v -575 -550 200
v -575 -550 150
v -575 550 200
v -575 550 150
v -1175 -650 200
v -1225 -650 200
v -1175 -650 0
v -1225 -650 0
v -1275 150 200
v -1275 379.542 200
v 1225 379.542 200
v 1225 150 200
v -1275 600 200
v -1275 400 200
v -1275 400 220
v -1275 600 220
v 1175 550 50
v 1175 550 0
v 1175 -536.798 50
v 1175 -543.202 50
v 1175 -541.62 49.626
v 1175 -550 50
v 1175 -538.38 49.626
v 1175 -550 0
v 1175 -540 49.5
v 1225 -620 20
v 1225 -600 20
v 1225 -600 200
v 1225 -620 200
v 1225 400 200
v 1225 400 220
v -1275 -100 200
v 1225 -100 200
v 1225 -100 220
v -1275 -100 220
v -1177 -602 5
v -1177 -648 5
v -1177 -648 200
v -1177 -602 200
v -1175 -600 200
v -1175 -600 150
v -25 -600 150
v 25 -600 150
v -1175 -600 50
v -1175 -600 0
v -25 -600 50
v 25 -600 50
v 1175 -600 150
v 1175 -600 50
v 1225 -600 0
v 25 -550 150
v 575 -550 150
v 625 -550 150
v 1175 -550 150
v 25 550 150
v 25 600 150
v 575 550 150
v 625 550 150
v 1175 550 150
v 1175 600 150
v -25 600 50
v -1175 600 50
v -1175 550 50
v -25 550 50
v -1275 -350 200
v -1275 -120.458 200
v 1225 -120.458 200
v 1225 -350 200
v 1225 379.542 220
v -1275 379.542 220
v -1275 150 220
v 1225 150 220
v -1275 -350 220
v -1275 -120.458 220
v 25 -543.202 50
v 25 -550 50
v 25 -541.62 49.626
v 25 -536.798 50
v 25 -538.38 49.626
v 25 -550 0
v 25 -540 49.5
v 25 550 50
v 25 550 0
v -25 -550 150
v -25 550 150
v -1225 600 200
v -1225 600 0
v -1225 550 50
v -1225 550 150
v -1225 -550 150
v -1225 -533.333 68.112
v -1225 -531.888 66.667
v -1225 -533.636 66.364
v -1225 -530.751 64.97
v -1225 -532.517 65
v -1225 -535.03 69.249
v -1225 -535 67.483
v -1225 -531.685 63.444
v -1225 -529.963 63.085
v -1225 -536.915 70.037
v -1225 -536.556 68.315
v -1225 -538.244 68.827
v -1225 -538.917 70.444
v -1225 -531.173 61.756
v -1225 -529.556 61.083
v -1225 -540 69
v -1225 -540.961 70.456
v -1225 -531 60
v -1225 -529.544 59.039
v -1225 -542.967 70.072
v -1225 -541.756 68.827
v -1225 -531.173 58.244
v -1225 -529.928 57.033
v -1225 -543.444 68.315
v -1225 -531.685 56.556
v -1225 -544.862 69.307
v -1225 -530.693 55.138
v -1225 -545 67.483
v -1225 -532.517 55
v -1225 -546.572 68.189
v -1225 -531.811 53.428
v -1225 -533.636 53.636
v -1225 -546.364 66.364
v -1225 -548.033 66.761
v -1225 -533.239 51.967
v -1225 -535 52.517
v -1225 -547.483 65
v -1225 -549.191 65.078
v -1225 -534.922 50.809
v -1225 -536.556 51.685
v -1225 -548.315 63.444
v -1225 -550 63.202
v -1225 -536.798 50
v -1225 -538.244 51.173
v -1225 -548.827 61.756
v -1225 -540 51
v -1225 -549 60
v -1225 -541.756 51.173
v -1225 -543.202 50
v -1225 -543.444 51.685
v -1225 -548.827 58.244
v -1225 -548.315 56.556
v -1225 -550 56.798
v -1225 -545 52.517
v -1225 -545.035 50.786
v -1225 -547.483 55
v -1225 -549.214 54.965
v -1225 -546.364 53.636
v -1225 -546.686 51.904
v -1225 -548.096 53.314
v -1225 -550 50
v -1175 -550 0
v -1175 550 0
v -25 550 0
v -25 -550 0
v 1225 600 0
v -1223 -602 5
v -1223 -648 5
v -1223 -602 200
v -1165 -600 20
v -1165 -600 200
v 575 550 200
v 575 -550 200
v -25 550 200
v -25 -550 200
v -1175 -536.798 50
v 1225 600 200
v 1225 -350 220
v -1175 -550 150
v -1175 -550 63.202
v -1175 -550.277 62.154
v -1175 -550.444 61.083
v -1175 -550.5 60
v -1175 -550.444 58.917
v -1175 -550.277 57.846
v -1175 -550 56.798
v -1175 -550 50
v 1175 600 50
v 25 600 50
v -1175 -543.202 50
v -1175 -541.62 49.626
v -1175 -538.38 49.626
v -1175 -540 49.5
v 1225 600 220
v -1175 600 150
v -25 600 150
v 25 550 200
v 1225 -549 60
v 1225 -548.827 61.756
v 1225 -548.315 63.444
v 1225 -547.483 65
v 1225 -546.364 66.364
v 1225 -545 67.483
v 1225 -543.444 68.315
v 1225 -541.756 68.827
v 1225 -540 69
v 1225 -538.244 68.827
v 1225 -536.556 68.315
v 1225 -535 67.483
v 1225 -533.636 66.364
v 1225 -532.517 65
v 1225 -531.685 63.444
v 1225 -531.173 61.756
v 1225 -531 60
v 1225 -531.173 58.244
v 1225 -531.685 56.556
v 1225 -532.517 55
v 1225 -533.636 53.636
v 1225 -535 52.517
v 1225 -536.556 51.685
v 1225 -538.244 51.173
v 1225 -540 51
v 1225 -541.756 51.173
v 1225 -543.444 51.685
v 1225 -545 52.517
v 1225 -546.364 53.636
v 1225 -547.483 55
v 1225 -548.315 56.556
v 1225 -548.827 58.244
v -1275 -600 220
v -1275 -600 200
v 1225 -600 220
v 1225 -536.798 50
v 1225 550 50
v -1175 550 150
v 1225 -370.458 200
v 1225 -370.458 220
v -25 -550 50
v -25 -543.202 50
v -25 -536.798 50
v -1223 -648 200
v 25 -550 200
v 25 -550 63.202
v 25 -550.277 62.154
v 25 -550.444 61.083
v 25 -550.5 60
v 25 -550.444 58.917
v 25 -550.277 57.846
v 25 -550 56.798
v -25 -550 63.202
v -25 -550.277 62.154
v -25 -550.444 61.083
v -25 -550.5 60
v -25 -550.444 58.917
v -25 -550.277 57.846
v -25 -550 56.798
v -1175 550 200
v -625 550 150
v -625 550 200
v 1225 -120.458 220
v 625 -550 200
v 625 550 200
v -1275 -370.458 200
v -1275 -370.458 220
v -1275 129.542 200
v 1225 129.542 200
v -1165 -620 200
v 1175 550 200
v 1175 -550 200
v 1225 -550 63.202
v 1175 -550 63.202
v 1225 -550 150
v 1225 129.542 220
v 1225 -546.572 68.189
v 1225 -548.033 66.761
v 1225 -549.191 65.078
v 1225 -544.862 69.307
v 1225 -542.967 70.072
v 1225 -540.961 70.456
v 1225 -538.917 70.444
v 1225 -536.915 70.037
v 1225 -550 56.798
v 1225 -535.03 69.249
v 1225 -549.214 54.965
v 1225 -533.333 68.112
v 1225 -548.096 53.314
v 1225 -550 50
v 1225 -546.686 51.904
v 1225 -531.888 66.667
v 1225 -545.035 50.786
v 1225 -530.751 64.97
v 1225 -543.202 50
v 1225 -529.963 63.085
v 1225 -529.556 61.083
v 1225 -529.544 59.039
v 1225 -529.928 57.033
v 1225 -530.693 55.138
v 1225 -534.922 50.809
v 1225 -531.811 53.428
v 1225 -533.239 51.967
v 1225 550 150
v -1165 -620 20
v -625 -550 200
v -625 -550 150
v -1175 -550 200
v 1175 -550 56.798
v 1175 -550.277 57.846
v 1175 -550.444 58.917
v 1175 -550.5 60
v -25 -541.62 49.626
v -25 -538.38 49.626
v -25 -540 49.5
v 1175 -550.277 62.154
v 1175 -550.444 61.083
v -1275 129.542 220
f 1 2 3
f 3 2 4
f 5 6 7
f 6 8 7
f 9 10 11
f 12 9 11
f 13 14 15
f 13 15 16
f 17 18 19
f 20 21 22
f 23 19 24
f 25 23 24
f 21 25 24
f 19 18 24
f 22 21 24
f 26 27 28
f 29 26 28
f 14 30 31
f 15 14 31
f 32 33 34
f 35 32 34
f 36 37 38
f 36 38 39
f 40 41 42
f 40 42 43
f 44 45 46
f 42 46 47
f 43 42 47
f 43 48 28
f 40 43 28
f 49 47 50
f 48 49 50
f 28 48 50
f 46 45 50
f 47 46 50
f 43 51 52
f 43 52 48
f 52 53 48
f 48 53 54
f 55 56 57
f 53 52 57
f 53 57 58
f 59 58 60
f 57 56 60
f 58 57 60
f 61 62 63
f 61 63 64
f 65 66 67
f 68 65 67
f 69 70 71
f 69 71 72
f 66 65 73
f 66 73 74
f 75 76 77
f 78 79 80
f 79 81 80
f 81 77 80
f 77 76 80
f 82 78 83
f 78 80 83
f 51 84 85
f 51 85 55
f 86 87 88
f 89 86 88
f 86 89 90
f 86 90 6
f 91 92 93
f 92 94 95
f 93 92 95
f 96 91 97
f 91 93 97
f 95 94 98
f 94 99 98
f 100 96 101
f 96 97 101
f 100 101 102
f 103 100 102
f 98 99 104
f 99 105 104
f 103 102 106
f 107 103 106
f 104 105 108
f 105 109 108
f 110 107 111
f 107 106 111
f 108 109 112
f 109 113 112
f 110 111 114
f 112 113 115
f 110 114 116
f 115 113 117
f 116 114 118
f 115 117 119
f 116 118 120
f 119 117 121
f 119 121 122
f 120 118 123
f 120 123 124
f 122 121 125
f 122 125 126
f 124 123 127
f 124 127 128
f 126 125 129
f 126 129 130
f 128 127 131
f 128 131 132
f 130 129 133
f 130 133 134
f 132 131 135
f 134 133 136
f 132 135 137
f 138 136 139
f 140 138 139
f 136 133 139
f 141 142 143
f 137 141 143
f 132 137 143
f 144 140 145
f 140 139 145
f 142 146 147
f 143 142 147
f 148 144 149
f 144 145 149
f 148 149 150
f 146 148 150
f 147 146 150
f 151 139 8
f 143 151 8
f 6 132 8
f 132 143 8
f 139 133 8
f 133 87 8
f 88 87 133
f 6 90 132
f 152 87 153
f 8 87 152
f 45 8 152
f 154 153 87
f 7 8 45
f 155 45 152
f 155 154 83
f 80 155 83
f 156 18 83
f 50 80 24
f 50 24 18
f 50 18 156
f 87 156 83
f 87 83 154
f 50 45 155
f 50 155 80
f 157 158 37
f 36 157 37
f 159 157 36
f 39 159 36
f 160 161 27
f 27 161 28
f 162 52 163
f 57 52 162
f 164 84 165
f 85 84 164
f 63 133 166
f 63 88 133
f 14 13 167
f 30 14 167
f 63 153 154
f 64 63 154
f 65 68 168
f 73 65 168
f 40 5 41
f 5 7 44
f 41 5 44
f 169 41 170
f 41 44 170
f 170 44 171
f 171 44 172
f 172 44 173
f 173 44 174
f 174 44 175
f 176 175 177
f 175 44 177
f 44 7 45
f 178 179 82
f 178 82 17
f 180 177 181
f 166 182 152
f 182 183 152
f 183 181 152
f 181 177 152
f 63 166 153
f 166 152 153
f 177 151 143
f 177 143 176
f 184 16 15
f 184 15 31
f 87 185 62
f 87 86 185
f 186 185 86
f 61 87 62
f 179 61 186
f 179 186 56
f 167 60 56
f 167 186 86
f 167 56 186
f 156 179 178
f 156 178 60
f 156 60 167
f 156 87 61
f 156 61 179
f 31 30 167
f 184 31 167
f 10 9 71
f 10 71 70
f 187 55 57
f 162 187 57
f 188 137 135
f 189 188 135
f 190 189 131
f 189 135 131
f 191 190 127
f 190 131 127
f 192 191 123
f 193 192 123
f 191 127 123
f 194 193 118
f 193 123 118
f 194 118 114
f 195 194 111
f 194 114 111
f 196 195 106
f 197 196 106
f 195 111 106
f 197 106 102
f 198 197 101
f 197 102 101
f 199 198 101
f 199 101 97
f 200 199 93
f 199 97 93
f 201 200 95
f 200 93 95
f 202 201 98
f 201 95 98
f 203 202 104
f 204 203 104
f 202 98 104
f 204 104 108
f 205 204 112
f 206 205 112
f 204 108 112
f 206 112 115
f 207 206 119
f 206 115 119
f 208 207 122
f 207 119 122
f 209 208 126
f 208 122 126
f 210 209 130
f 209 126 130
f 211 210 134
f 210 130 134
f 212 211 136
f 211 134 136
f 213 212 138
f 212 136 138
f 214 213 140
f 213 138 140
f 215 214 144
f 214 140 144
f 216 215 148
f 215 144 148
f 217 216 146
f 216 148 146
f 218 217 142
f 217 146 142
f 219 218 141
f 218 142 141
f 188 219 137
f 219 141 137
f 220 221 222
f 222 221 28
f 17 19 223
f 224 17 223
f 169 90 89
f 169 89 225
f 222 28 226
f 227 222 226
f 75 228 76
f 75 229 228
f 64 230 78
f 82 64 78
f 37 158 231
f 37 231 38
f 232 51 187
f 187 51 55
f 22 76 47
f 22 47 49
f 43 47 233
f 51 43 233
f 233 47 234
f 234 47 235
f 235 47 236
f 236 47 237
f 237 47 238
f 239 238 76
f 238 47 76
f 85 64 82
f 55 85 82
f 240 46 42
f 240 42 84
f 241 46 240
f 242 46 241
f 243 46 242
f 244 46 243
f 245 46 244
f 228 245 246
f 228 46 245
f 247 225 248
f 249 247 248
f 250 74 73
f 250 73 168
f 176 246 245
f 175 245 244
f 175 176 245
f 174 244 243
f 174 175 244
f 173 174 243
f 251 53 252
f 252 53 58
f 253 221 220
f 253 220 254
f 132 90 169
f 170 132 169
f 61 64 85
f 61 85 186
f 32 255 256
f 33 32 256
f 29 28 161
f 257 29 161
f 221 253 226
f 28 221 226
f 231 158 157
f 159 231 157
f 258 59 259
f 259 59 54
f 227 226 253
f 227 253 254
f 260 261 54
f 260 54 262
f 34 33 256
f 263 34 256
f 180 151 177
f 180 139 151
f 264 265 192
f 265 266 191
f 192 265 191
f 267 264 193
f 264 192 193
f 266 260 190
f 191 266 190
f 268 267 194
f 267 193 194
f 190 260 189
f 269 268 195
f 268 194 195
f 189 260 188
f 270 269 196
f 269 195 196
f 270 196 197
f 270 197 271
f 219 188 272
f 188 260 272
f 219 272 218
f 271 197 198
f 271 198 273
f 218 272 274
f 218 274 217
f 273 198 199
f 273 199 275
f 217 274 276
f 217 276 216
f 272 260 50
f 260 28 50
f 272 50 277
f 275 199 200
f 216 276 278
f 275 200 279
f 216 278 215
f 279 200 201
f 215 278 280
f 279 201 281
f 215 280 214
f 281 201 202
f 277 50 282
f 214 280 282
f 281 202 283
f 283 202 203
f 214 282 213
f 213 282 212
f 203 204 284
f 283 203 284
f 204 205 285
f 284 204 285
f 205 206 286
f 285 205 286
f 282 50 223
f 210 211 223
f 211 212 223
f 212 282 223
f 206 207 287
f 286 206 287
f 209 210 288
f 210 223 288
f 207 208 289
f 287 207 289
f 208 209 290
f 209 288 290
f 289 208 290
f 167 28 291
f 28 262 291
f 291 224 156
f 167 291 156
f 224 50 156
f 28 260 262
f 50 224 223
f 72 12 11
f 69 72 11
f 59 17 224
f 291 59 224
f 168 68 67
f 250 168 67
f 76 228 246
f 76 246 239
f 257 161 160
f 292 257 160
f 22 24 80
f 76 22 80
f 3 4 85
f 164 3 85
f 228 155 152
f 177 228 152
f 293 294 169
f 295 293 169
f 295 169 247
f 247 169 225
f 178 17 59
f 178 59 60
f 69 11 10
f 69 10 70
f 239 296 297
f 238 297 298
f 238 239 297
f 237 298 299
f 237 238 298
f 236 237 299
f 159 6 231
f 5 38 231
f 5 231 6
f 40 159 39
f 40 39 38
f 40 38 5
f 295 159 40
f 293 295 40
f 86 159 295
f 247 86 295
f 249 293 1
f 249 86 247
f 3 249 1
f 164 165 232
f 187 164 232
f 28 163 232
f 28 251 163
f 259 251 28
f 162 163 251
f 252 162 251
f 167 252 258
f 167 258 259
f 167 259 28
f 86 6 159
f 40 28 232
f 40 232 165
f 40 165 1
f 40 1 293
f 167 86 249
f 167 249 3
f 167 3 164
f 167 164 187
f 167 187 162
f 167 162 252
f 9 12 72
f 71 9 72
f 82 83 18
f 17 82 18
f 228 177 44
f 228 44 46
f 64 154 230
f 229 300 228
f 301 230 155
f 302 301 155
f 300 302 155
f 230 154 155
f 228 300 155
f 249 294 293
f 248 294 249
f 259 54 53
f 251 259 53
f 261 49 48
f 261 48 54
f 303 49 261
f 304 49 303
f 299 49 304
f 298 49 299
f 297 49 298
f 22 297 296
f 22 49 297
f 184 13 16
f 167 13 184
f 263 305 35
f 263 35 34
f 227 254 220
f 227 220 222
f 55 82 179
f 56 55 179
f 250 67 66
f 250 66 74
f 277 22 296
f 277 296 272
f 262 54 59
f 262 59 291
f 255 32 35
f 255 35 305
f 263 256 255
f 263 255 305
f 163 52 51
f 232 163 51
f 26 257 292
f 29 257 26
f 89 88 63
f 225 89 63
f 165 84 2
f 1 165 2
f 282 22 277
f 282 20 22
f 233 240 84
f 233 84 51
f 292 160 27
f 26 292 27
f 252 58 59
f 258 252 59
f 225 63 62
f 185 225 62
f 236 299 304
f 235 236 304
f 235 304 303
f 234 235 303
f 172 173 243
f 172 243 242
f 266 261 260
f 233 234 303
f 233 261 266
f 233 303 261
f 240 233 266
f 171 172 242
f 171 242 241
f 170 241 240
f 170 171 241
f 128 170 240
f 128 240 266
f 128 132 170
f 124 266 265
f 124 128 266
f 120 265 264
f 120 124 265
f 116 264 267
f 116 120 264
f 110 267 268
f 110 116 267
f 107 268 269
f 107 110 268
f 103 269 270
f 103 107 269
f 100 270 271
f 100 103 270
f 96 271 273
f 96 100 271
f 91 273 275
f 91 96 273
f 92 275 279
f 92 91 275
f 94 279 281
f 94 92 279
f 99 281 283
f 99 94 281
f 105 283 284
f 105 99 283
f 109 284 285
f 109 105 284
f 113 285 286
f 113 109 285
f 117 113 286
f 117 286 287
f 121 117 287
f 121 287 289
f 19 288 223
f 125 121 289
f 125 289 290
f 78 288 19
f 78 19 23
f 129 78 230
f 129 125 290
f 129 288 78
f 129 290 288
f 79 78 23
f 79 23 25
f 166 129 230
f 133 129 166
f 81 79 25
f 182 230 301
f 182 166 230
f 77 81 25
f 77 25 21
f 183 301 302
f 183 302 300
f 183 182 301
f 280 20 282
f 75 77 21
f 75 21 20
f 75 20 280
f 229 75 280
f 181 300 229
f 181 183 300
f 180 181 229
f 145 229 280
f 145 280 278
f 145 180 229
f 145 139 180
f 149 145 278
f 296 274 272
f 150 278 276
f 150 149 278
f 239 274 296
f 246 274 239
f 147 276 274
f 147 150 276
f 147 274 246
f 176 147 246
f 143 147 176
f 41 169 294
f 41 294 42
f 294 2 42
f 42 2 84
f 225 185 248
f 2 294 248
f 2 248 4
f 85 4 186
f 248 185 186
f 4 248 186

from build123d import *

# Parameters (mm, degrees)
F0_W      = 50
F0_H      = 50
F0_H_2    = 1100
F1_DEPTH  = 50
F2_W      = 50
F2_H      = 50
F3_DEPTH  = 100
F4_W      = 2450
F4_H      = 1200
F4_W_2    = 25
F4_H_2    = 1100
F4_W_3    = 50
F5_DEPTH  = 50
F6_R      = 9
F7_DEPTH  = 2450
F9_DEPTH  = 20
F10_W     = 2500
F10_H     = 1200
F11_DEPTH = 20
F12_DEPTH = 110
F13_W     = 50
F13_H     = 50
F14_DEPTH = 5
F15_W     = 2
F15_H     = 2
F15_W_2   = 46
F15_H_2   = 46
F16_DEPTH = 195
F17_W     = 20.458304882
F17_H     = 20
F18_DEPTH = 2500


with BuildPart() as f1:
    # F0 (on Top) → F1 (new body)
    with BuildSketch(Plane.XY):
        with Locations((1200, -575)):
            Rectangle(F0_W, F0_H)
        Polygon((-1175, -600), (1175, -600), (1175, -550), (25, -550), (0, -550), (-25, -550), (-1175, -550), align=None)
        with Locations((1200, 0)):
            Rectangle(F0_W, F0_H_2)
        with Locations((-1200, -575)):
            Rectangle(F0_W, F0_H)
        with Locations((1200, 575)):
            Rectangle(F0_W, F0_H)
        with Locations((-1200, 0)):
            Rectangle(F0_W, F0_H_2)
        Polygon((25, 550), (1175, 550), (1175, 600), (-1175, 600), (-1175, 550), (-25, 550), (0, 550), align=None)
        with Locations((-1200, 575)):
            Rectangle(F0_W, F0_H)
        Polygon((0, -550), (25, -550), (25, 0), (25, 550), (0, 550), (0, 0), align=None)
        Polygon((-25, 0), (-25, -550), (0, -550), (0, 0), (0, 550), (-25, 550), align=None)
    extrude(amount=F1_DEPTH)

    # F2 (on face) → F3 (join)
    with BuildSketch(Plane.XY.offset(50)):
        with Locations((0, 575)):
            Rectangle(F2_W, F2_H)
        with Locations((-1200, 575)):
            Rectangle(F2_W, F2_H)
        with Locations((-1200, -575)):
            Rectangle(F2_W, F2_H)
        with Locations((0, -575)):
            Rectangle(F2_W, F2_H)
        with Locations((1200, -575)):
            Rectangle(F2_W, F2_H)
        with Locations((1200, 575)):
            Rectangle(F2_W, F2_H)
    extrude(amount=F3_DEPTH)

    # F4 (on face) → F5 (join)
    with BuildSketch(Plane.XY.offset(150)):
        Rectangle(F4_W, F4_H)
        Polygon((1175, 550), (1175, -550), (625, -550), (600, -550), (575, -550), (25, -550), (-25, -550), (-575, -550), (-600, -550), (-625, -550), (-1175, -550), (-1175, 550), (-625, 550), (-600, 550), (-575, 550), (-25, 550), (25, 550), (575, 550), (600, 550), (625, 550), align=None, mode=Mode.SUBTRACT)
        with Locations((-587.5, 0)):
            Rectangle(F4_W_2, F4_H_2)
        with Locations((-612.5, 0)):
            Rectangle(F4_W_2, F4_H_2)
        with Locations((612.5, 0)):
            Rectangle(F4_W_2, F4_H_2)
        with Locations((587.5, 0)):
            Rectangle(F4_W_2, F4_H_2)
        Rectangle(F4_W_3, F4_H_2)
    extrude(amount=F5_DEPTH)

    # F6 (on face) → F7 (join)
    with BuildSketch(Plane(origin=(-1225, 0, 0), x_dir=(0, -1, 0), z_dir=(-1, 0, 0))):
        with BuildLine():
            ThreePointArc((550.5, 60), (529.6257530394, 61.6201851746), (550, 56.7984378813))
            ThreePointArc((550, 56.7984378813), (550.3742469606, 58.3798148254), (550.5, 60))
        make_face()
        with Locations((540, 60)):
            Circle(F6_R, mode=Mode.SUBTRACT)
    extrude(amount=-F7_DEPTH)

    # F13 (on face) → F14 (join)
    with BuildSketch(Plane(origin=(0, 0, 0), x_dir=(1, 0, 0), z_dir=(0, 0, -1))):
        with Locations((-1200, 625)):
            Rectangle(F13_W, F13_H)
    extrude(amount=-F14_DEPTH)

    # F15 (on face) → F16 (join, through all)
    with BuildSketch(Plane.XY.offset(5)):
        with Locations((-1224, -601)):
            Rectangle(F15_W, F15_H)
        Polygon((-1175, -600), (-1223, -600), (-1223, -602), (-1225, -602), (-1225, -650), (-1175, -650), align=None)
        with Locations((-1200, -625)):
            Rectangle(F15_W_2, F15_H_2, mode=Mode.SUBTRACT)
    extrude(amount=F16_DEPTH)


with BuildPart() as f9:
    # F8 (on face) → F9 (new body)
    with BuildSketch(Plane.XZ.offset(600)):
        Polygon((1225, 20), (1225, 200), (-1225, 200), (-1275, 200), (-1275, 20), align=None)
    extrude(amount=F9_DEPTH)

    # F12 (cut): a face of the model
    f12_faces = [f9.faces().sort_by_distance(p)[0] for p in [
        (-1275, -610, 110),
    ]]
    extrude(f12_faces, amount=-F12_DEPTH, mode=Mode.SUBTRACT)


with BuildPart() as f11:
    # F10 (on face) → F11 (new body)
    with BuildSketch(Plane.XY.offset(200)):
        with Locations((-25, 0)):
            Rectangle(F10_W, F10_H)
    extrude(amount=F11_DEPTH)

    # F17 (on face) → F18 (cut, through all)
    with BuildSketch(Plane(origin=(-1275, 0, 0), x_dir=(0, -1, 0), z_dir=(-1, 0, 0))):
        with Locations((610.229152441, 210)):
            Rectangle(F17_W, F17_H)
        with Locations((360.229152441, 210)):
            Rectangle(F17_W, F17_H)
        with Locations((110.229152441, 210)):
            Rectangle(F17_W, F17_H)
        with Locations((-139.770847559, 210)):
            Rectangle(F17_W, F17_H)
        with Locations((-389.770847559, 210)):
            Rectangle(F17_W, F17_H)
    extrude(amount=-F18_DEPTH, mode=Mode.SUBTRACT)


solid = Compound([f1.part, f9.part, f11.part])
